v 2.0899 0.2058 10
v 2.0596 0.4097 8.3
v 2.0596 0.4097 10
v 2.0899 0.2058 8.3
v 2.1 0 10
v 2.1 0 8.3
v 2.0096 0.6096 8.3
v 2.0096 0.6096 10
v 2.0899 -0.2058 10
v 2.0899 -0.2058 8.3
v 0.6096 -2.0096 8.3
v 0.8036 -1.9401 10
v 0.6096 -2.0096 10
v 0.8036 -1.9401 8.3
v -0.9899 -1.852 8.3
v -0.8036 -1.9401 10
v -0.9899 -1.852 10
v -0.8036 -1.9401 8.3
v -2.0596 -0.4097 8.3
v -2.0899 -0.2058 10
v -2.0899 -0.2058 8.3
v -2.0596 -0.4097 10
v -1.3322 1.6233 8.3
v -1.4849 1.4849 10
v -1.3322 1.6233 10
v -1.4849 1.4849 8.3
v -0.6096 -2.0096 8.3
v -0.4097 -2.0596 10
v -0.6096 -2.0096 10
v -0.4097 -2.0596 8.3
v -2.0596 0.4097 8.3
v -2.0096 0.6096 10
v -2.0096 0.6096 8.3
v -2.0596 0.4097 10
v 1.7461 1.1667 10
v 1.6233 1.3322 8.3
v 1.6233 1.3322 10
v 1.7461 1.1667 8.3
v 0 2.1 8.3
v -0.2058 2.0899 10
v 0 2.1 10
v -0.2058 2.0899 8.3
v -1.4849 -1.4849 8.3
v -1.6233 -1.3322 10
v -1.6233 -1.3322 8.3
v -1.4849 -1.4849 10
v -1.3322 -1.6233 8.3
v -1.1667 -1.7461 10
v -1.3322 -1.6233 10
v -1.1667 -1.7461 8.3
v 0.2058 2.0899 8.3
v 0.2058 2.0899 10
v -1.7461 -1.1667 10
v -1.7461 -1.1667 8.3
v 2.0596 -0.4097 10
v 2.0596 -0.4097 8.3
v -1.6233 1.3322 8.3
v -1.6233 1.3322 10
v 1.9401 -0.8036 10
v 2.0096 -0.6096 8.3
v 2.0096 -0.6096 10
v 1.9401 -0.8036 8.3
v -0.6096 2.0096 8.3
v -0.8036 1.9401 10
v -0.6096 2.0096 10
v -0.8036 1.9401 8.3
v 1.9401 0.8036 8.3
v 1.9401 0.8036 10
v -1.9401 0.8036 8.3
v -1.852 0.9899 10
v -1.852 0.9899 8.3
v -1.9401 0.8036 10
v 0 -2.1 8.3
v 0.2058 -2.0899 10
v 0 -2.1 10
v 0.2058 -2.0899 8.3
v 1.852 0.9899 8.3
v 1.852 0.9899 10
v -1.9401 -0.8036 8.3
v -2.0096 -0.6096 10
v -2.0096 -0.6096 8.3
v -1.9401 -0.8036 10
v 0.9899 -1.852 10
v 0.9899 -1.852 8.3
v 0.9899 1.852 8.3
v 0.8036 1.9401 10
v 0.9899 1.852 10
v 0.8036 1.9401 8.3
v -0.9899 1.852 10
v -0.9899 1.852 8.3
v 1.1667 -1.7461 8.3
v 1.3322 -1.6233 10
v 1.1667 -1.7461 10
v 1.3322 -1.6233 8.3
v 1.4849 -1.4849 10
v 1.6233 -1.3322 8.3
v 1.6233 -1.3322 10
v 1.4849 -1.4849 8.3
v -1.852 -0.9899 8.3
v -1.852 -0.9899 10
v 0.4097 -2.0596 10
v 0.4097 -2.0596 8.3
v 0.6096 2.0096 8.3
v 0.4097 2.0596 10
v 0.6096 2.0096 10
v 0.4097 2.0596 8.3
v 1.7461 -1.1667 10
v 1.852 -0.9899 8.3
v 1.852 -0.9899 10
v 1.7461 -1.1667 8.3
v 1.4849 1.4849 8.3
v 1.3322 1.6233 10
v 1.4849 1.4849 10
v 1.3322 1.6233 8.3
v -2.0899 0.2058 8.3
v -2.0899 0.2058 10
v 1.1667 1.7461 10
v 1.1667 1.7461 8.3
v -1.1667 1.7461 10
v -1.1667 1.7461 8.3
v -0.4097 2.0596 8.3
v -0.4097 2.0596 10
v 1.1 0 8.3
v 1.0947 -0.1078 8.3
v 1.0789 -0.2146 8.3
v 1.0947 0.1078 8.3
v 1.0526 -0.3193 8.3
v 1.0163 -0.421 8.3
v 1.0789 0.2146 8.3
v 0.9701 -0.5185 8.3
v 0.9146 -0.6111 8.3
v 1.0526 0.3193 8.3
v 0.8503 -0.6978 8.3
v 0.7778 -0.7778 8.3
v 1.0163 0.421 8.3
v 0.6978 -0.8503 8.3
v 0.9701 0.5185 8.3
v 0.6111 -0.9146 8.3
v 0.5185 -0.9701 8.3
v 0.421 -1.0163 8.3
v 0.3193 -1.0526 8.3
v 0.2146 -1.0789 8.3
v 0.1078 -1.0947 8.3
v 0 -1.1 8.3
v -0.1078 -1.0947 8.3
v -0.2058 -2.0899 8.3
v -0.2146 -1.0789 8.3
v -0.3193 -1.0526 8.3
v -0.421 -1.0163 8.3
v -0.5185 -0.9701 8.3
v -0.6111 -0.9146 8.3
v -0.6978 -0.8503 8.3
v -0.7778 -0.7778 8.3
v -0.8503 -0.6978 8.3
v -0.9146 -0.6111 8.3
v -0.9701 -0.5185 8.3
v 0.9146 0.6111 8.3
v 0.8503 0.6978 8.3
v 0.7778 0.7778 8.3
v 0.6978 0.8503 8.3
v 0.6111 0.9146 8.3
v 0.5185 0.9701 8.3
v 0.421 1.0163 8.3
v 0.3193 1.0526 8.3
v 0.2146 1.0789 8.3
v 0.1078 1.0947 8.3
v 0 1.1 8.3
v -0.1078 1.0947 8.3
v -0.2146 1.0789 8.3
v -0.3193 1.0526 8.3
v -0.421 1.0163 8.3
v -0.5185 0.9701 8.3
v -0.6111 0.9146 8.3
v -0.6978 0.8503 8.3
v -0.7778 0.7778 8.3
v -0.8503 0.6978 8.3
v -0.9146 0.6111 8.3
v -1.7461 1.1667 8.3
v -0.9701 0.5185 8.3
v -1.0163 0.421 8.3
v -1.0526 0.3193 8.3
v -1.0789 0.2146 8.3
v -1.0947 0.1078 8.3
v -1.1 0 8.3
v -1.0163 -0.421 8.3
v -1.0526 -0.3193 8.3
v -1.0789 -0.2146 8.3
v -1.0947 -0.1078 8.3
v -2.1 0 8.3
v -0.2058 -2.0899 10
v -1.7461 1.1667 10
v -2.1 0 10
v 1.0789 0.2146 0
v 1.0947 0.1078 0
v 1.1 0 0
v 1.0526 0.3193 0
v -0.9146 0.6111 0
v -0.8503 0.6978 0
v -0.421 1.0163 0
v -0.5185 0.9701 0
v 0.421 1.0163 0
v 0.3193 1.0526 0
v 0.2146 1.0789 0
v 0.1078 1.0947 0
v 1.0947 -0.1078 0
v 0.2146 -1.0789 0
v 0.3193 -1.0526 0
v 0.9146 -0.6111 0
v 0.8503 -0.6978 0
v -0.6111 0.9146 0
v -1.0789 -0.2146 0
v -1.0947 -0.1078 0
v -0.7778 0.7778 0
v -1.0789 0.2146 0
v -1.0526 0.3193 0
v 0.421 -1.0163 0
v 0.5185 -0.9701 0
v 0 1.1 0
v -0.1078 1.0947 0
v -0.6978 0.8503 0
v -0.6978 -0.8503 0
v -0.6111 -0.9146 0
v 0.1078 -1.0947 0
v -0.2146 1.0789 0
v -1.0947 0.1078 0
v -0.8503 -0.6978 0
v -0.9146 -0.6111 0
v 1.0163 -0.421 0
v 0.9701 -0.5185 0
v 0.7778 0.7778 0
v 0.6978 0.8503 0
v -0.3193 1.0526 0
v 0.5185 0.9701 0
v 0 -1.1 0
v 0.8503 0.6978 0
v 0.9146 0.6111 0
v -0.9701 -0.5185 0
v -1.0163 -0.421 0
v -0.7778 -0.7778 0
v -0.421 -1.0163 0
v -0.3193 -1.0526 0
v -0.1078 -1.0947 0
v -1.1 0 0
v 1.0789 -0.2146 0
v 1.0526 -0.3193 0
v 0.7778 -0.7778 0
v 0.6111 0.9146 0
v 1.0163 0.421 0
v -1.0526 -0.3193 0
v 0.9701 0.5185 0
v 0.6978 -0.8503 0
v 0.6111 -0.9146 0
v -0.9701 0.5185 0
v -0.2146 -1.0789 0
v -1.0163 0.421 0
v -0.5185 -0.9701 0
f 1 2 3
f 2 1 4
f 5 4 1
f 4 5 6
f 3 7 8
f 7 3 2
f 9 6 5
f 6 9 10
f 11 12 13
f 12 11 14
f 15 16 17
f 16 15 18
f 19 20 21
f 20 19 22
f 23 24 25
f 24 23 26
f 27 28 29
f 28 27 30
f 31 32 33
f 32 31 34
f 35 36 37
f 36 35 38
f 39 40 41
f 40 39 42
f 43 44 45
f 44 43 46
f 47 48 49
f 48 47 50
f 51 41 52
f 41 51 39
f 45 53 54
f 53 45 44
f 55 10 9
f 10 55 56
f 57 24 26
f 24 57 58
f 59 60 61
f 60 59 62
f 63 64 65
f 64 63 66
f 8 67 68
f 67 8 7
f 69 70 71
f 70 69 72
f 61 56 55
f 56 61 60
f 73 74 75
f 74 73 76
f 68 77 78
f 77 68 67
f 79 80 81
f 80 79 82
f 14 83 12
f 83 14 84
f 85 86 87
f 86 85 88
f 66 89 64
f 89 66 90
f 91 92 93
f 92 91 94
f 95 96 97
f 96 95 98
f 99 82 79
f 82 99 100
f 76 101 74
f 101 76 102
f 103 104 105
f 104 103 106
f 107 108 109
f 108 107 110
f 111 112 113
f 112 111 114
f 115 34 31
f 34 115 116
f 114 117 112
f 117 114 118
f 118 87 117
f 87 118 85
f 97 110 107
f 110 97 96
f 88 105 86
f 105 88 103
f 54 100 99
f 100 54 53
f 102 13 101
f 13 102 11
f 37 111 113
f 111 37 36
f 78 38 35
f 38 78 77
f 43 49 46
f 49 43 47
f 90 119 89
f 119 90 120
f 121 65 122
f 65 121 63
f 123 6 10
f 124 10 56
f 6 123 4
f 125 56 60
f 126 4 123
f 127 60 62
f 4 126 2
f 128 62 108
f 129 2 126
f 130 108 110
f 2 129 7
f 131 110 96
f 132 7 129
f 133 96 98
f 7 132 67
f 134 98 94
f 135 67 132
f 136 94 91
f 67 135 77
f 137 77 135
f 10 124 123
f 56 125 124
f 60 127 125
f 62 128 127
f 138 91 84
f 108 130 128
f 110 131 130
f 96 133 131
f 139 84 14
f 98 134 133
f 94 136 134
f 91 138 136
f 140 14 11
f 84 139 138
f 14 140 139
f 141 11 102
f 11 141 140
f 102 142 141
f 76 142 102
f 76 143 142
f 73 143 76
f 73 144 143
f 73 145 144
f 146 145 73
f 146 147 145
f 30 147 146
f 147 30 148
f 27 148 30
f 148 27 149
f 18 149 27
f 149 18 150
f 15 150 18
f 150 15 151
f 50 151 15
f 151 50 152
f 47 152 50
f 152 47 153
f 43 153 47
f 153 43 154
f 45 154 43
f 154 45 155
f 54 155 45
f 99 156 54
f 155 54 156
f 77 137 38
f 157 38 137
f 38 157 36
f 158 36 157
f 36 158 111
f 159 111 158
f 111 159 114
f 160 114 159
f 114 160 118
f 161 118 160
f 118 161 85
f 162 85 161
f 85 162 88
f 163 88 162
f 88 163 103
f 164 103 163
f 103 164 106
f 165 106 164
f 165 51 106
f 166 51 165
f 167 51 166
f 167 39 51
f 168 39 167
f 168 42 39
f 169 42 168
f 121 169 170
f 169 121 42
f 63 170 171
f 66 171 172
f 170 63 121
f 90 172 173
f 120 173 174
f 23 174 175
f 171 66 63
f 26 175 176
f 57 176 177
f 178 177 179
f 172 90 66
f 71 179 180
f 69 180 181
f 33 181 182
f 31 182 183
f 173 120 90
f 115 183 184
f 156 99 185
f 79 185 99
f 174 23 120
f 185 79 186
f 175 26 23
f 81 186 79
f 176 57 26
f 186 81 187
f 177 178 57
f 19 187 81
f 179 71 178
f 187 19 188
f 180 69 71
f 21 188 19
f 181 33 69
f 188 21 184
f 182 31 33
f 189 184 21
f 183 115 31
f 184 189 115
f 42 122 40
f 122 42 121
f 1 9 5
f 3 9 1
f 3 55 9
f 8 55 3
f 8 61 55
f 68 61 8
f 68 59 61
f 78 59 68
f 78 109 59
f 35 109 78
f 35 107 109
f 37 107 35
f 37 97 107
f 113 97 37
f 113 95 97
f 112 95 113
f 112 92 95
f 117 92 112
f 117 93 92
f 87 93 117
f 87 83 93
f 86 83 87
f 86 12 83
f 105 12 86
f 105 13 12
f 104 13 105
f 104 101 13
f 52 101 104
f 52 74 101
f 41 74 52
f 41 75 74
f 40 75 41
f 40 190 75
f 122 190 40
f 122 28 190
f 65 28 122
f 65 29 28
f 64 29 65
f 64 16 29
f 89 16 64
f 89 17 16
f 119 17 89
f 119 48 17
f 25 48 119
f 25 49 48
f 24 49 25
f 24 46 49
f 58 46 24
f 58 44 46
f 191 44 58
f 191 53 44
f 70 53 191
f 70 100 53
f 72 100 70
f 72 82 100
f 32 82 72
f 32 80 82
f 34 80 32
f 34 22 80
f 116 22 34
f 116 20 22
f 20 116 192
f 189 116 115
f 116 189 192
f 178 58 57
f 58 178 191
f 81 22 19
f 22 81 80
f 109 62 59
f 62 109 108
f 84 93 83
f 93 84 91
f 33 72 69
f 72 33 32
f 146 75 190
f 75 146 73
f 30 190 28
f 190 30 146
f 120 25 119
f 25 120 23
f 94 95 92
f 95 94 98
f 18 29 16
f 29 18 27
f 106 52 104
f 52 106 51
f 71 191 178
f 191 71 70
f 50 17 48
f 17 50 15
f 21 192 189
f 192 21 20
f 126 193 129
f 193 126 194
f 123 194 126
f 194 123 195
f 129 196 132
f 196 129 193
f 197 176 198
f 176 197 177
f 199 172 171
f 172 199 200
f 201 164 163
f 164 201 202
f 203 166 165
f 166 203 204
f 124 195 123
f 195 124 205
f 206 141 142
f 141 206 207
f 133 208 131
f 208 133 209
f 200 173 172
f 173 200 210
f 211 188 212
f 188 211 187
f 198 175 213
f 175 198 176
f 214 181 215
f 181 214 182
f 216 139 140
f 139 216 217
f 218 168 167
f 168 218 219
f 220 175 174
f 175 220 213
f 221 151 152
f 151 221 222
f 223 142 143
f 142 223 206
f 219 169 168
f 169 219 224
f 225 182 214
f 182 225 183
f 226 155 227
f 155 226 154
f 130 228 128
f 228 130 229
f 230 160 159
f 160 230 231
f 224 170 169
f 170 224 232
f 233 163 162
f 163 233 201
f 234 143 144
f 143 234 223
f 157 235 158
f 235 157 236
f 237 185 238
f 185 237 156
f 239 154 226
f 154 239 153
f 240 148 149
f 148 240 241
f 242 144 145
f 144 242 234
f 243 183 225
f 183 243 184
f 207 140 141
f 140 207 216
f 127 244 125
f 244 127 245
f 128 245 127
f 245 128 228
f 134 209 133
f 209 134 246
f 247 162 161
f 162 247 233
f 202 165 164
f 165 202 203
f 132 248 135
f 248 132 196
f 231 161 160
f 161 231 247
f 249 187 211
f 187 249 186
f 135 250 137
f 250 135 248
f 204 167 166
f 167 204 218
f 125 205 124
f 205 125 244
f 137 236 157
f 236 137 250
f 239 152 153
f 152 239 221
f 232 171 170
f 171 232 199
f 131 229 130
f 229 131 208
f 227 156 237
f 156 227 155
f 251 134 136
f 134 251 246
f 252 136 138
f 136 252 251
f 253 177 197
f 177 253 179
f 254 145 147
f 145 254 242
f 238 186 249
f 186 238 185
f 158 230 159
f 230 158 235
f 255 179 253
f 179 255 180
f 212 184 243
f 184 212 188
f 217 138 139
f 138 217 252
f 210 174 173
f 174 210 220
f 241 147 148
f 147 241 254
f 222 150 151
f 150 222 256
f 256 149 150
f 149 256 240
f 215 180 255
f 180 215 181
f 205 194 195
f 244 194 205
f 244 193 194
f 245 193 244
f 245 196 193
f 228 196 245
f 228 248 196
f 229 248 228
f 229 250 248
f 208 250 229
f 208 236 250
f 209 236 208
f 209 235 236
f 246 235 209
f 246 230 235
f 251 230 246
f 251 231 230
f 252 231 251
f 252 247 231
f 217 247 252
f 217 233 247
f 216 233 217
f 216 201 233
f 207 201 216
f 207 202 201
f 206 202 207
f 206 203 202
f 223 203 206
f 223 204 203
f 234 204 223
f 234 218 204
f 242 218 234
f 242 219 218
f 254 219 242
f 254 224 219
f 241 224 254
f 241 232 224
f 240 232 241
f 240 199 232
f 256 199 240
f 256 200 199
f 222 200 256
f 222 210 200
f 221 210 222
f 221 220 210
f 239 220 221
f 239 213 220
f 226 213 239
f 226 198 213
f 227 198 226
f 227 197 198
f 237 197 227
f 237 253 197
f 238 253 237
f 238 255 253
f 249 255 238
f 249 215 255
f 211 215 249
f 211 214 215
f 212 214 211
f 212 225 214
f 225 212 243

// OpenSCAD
module pan_head_screw() {
    union() {
        // Screw head
        translate([0, 0, 10 - 1.7])
            cylinder(h = 1.7, d = 4.2, $fn = 64);
        
        // Screw shaft
        translate([0, 0, 0])
            cylinder(h = 10, d = 2.2, $fn = 64);
    }
}

pan_head_screw();
